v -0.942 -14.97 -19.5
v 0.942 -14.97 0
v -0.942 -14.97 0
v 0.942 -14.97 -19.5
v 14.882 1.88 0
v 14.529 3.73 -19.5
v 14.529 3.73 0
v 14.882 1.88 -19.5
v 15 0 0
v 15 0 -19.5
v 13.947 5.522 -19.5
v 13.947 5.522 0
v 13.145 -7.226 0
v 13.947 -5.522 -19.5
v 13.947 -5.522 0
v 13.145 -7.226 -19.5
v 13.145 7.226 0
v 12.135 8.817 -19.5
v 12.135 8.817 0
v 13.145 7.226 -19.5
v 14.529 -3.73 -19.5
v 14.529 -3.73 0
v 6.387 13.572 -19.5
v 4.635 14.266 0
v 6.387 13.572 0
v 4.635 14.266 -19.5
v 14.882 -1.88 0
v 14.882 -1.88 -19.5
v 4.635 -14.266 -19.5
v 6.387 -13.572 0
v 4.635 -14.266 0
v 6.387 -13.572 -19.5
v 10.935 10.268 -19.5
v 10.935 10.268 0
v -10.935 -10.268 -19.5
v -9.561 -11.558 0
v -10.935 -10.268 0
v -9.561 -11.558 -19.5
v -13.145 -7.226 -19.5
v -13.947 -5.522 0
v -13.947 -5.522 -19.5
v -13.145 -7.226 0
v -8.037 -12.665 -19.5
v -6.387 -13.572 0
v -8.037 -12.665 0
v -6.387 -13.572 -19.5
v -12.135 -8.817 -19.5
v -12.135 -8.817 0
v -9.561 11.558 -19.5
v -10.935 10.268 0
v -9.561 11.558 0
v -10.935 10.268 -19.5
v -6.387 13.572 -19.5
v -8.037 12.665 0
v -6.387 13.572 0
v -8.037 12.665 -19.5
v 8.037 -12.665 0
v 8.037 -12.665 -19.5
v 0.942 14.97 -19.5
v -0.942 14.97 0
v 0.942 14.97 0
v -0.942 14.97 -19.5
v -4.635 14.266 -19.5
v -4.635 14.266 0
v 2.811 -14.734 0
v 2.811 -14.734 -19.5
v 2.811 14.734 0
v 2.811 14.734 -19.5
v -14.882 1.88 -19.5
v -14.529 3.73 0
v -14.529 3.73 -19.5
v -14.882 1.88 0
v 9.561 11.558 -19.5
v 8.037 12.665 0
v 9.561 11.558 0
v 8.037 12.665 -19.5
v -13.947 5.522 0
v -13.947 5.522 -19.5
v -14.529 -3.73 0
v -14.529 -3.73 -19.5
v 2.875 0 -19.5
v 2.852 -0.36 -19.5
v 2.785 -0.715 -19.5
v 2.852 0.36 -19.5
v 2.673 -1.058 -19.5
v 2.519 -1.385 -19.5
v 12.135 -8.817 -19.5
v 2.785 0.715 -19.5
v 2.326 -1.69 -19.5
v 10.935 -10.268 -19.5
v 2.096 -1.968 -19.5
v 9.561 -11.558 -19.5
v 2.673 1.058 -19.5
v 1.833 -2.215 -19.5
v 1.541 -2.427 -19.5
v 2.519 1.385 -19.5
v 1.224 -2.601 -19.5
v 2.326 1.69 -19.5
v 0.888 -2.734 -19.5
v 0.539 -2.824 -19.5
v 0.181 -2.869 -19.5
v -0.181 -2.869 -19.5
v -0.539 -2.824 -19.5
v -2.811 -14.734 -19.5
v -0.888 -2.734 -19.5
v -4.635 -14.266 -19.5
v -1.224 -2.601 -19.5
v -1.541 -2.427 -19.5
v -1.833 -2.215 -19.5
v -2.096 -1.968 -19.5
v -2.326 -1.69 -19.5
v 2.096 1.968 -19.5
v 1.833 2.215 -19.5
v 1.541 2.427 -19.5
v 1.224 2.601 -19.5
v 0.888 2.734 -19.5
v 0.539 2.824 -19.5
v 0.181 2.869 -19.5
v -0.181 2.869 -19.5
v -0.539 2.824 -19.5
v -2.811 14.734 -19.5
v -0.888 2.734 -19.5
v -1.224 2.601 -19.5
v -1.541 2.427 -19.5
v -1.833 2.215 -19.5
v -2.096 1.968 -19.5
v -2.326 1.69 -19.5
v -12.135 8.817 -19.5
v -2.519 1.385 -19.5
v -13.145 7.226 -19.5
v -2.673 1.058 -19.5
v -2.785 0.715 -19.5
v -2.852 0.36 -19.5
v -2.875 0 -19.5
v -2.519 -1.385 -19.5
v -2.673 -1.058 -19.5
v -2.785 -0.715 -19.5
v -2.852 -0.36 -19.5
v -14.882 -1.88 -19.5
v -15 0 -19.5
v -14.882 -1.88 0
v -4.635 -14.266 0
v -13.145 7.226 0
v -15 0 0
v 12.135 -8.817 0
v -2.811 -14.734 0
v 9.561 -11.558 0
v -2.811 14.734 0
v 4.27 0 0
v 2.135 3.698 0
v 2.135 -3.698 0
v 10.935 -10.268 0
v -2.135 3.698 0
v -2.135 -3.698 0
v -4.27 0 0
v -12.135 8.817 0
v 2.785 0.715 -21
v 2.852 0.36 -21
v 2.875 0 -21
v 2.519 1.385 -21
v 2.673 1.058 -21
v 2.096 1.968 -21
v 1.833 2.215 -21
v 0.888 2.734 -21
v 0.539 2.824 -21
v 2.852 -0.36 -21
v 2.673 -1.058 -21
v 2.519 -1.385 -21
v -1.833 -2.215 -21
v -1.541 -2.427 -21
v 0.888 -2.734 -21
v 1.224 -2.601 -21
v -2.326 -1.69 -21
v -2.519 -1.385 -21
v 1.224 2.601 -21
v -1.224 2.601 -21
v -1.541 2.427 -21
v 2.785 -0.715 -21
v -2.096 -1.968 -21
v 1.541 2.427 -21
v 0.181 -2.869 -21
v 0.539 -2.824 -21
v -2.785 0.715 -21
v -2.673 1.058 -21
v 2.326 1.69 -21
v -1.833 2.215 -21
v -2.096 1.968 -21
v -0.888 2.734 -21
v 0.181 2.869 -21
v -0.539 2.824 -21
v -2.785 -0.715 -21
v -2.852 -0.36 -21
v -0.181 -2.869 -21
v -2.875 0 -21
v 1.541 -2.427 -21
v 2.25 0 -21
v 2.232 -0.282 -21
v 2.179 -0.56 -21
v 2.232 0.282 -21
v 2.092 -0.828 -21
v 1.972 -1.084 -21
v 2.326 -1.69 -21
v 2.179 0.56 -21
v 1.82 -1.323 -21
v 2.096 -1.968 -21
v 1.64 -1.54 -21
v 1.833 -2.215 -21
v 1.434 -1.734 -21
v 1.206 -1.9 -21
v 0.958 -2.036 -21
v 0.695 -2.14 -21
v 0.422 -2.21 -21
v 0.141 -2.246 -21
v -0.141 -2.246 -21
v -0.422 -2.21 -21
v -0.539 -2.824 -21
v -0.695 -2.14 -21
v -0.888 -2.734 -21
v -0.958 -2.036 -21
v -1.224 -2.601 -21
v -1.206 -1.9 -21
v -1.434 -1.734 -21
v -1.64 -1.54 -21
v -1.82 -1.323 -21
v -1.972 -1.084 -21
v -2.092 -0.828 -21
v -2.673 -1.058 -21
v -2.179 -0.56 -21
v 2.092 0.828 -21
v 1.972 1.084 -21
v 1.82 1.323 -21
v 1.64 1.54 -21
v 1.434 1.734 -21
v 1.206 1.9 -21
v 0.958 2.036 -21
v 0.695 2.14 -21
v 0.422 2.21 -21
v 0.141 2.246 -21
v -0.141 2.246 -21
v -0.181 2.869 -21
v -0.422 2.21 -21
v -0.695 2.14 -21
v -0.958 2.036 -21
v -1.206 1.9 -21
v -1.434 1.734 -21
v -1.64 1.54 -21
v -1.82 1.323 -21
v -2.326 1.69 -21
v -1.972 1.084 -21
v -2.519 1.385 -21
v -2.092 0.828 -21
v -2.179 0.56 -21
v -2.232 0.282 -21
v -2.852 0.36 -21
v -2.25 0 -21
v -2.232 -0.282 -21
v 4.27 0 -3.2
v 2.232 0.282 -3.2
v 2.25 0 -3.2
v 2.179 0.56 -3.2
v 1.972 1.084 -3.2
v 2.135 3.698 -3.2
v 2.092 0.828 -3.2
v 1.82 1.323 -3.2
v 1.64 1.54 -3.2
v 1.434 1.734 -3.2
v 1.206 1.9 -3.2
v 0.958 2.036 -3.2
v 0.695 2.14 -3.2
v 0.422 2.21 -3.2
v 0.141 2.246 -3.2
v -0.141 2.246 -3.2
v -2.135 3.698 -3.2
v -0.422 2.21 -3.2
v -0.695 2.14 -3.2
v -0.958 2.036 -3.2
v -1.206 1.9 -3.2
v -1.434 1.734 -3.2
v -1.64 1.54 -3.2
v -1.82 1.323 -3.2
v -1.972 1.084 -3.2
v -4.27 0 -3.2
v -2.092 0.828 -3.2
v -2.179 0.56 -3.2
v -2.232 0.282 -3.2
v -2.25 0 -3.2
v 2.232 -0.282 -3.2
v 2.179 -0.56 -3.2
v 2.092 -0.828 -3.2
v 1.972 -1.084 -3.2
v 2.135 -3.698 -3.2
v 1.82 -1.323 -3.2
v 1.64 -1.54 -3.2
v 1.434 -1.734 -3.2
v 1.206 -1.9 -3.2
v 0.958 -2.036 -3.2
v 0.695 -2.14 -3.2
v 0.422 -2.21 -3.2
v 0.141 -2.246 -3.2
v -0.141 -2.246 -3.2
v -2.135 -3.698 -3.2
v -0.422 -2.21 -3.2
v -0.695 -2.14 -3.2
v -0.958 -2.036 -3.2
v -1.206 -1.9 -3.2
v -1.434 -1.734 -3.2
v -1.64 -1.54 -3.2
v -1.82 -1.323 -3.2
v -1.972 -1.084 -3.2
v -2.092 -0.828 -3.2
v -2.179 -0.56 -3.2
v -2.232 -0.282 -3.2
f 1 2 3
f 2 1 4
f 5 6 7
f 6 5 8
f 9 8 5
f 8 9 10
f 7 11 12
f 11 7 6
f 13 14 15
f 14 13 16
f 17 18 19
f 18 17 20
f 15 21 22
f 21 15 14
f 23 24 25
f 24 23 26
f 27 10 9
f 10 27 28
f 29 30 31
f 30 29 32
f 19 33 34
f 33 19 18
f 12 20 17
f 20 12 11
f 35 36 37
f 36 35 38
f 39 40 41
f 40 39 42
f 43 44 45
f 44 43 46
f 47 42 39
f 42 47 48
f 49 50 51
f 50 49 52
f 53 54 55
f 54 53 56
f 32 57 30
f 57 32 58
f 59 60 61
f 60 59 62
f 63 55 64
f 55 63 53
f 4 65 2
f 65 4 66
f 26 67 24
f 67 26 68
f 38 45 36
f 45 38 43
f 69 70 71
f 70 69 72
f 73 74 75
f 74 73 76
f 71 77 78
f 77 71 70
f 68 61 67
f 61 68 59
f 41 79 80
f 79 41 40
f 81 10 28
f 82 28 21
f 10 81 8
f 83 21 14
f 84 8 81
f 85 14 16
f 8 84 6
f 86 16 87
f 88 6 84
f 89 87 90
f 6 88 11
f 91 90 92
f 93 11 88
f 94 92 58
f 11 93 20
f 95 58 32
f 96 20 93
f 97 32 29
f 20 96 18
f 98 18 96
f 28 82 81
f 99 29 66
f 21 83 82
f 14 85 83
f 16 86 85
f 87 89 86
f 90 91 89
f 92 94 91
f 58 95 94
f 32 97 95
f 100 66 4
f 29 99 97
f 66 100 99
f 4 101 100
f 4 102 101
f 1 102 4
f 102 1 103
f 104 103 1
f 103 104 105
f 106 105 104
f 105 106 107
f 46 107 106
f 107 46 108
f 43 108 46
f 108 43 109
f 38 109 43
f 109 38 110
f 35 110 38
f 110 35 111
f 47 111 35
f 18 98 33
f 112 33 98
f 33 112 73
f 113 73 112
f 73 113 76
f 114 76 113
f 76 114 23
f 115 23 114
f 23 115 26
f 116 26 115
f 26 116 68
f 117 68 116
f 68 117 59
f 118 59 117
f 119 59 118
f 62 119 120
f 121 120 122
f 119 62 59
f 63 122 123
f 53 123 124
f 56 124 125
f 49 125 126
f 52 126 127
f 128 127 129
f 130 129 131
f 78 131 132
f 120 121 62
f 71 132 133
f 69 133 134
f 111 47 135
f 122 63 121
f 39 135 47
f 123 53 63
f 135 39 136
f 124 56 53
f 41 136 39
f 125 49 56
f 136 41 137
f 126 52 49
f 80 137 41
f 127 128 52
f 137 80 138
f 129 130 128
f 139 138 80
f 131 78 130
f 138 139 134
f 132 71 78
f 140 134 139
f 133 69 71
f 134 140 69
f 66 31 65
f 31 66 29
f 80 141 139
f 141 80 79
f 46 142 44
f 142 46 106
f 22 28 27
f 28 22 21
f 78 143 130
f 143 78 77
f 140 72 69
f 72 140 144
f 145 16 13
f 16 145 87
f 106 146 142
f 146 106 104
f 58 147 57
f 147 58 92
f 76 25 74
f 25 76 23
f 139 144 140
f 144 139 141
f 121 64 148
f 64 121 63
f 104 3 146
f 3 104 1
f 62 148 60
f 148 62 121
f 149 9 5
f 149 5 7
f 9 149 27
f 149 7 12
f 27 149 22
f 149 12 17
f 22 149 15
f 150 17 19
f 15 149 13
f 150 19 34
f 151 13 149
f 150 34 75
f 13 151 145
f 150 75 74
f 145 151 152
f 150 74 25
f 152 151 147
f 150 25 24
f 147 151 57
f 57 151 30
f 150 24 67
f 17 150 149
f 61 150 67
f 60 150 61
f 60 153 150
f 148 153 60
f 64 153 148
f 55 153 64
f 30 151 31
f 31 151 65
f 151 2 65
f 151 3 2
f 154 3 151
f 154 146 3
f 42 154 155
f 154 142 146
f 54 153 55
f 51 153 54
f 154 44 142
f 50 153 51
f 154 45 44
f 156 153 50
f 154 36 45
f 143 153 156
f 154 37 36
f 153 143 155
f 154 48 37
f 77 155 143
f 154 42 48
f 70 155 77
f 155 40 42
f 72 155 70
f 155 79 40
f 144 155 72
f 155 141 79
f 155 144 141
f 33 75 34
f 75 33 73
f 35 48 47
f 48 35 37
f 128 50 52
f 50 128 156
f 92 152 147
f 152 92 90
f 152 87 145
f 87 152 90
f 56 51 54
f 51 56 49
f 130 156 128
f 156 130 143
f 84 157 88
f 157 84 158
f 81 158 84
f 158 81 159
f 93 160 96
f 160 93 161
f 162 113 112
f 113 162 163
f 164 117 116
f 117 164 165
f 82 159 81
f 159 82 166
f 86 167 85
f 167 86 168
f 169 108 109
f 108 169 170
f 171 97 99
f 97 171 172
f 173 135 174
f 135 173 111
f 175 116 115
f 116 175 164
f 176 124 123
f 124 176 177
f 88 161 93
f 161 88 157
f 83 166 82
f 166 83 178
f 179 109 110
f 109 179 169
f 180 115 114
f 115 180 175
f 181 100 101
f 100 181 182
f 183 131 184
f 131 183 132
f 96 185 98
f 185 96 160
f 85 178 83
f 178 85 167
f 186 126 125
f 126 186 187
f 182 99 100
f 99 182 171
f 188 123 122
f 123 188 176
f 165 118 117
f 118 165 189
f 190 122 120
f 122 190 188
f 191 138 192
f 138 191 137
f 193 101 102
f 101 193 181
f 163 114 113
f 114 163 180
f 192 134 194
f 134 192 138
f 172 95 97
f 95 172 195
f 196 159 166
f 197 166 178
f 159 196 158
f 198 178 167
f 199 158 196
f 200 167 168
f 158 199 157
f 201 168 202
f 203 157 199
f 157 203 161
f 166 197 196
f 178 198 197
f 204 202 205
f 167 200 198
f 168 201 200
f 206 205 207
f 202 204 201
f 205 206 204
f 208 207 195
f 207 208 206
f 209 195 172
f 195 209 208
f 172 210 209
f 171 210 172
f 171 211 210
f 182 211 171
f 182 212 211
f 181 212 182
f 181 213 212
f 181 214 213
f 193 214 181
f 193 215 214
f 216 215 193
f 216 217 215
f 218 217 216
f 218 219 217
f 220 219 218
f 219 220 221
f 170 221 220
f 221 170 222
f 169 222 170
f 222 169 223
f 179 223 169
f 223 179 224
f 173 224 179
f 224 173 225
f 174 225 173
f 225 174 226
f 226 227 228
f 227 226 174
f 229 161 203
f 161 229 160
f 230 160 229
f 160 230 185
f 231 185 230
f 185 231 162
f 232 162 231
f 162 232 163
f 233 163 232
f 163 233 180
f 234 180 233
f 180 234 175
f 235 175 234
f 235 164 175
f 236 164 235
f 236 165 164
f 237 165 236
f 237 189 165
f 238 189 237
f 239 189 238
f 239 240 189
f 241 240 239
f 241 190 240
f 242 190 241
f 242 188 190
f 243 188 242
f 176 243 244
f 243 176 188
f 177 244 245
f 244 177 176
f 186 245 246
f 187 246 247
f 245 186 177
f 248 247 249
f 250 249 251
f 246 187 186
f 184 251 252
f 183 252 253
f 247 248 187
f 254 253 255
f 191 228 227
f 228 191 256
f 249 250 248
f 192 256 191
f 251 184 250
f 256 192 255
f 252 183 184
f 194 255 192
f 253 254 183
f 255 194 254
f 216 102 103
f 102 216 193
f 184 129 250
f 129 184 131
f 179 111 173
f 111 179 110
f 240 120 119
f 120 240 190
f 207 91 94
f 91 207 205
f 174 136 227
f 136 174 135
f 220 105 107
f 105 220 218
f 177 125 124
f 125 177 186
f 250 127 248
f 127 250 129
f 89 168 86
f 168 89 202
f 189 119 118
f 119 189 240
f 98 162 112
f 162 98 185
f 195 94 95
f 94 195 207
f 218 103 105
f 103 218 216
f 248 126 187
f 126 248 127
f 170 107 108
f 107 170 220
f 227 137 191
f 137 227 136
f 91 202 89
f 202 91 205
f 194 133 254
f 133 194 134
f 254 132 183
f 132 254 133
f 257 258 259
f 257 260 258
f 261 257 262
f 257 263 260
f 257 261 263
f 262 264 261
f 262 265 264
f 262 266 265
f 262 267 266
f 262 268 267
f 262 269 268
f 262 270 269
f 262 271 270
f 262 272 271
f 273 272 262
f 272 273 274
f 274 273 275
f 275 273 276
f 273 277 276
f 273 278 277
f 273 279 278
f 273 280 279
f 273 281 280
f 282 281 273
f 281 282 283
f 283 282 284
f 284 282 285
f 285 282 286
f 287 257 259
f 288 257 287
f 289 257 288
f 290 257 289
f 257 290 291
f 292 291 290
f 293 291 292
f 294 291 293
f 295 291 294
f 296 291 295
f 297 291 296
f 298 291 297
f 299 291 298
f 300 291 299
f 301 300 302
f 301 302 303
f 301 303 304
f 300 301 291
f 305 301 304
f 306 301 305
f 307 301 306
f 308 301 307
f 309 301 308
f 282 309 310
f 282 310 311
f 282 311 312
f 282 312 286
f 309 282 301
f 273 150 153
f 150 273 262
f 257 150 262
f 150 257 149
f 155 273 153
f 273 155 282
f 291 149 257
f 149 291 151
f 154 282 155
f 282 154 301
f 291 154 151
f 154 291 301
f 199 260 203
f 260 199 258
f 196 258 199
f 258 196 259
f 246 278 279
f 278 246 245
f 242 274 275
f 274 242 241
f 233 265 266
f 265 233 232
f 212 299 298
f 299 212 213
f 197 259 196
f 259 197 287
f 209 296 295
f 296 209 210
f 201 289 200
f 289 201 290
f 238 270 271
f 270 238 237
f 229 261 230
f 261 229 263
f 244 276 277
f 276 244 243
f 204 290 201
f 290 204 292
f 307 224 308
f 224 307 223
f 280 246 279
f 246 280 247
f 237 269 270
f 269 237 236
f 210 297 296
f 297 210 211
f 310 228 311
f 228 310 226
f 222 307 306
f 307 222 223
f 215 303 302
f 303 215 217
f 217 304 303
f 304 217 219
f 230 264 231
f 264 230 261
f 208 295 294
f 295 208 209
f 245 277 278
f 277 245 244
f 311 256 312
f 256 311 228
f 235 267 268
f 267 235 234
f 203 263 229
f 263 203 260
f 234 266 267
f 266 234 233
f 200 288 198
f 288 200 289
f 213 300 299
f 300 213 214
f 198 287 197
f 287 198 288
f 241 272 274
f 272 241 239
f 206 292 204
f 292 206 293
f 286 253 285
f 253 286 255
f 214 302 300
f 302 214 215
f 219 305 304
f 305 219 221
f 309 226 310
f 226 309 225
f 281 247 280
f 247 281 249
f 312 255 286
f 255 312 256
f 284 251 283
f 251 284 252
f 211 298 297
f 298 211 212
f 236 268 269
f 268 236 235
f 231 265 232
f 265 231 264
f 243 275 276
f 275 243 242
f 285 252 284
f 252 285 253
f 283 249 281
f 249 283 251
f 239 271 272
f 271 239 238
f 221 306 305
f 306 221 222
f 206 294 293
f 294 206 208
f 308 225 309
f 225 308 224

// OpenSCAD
$fn = 50;

difference() {
	union() {
		translate(v = [0, 0, -19.5]) {
			cylinder(h = 19.5, r = 15.0);
		}
		#translate(v = [0, 0, -21.0]) {
			cylinder(h = 21, r = 2.875);
		}
	}
	union() {
		translate(v = [0, 0, 0]) {
			rotate(a = [0, 0, 0]) {
				difference() {
					union() {
						translate(v = [0, 0, -3.2]) {
							linear_extrude(height = 3.2) {
								polygon(points = [[4.2698, 0.0], [2.1349000000000005, 3.697755269078796], [-2.134899999999999, 3.6977552690787965], [-4.2698, 5.228996902999369e-16], [-2.134900000000002, -3.6977552690787956], [2.1348999999999974, -3.697755269078798]]);
							}
						}
					}
					union();
				}
			}
		}
		#translate(v = [0, 0, -100.0]) {
			cylinder(h = 200, r = 2.25);
		}
	}
}
